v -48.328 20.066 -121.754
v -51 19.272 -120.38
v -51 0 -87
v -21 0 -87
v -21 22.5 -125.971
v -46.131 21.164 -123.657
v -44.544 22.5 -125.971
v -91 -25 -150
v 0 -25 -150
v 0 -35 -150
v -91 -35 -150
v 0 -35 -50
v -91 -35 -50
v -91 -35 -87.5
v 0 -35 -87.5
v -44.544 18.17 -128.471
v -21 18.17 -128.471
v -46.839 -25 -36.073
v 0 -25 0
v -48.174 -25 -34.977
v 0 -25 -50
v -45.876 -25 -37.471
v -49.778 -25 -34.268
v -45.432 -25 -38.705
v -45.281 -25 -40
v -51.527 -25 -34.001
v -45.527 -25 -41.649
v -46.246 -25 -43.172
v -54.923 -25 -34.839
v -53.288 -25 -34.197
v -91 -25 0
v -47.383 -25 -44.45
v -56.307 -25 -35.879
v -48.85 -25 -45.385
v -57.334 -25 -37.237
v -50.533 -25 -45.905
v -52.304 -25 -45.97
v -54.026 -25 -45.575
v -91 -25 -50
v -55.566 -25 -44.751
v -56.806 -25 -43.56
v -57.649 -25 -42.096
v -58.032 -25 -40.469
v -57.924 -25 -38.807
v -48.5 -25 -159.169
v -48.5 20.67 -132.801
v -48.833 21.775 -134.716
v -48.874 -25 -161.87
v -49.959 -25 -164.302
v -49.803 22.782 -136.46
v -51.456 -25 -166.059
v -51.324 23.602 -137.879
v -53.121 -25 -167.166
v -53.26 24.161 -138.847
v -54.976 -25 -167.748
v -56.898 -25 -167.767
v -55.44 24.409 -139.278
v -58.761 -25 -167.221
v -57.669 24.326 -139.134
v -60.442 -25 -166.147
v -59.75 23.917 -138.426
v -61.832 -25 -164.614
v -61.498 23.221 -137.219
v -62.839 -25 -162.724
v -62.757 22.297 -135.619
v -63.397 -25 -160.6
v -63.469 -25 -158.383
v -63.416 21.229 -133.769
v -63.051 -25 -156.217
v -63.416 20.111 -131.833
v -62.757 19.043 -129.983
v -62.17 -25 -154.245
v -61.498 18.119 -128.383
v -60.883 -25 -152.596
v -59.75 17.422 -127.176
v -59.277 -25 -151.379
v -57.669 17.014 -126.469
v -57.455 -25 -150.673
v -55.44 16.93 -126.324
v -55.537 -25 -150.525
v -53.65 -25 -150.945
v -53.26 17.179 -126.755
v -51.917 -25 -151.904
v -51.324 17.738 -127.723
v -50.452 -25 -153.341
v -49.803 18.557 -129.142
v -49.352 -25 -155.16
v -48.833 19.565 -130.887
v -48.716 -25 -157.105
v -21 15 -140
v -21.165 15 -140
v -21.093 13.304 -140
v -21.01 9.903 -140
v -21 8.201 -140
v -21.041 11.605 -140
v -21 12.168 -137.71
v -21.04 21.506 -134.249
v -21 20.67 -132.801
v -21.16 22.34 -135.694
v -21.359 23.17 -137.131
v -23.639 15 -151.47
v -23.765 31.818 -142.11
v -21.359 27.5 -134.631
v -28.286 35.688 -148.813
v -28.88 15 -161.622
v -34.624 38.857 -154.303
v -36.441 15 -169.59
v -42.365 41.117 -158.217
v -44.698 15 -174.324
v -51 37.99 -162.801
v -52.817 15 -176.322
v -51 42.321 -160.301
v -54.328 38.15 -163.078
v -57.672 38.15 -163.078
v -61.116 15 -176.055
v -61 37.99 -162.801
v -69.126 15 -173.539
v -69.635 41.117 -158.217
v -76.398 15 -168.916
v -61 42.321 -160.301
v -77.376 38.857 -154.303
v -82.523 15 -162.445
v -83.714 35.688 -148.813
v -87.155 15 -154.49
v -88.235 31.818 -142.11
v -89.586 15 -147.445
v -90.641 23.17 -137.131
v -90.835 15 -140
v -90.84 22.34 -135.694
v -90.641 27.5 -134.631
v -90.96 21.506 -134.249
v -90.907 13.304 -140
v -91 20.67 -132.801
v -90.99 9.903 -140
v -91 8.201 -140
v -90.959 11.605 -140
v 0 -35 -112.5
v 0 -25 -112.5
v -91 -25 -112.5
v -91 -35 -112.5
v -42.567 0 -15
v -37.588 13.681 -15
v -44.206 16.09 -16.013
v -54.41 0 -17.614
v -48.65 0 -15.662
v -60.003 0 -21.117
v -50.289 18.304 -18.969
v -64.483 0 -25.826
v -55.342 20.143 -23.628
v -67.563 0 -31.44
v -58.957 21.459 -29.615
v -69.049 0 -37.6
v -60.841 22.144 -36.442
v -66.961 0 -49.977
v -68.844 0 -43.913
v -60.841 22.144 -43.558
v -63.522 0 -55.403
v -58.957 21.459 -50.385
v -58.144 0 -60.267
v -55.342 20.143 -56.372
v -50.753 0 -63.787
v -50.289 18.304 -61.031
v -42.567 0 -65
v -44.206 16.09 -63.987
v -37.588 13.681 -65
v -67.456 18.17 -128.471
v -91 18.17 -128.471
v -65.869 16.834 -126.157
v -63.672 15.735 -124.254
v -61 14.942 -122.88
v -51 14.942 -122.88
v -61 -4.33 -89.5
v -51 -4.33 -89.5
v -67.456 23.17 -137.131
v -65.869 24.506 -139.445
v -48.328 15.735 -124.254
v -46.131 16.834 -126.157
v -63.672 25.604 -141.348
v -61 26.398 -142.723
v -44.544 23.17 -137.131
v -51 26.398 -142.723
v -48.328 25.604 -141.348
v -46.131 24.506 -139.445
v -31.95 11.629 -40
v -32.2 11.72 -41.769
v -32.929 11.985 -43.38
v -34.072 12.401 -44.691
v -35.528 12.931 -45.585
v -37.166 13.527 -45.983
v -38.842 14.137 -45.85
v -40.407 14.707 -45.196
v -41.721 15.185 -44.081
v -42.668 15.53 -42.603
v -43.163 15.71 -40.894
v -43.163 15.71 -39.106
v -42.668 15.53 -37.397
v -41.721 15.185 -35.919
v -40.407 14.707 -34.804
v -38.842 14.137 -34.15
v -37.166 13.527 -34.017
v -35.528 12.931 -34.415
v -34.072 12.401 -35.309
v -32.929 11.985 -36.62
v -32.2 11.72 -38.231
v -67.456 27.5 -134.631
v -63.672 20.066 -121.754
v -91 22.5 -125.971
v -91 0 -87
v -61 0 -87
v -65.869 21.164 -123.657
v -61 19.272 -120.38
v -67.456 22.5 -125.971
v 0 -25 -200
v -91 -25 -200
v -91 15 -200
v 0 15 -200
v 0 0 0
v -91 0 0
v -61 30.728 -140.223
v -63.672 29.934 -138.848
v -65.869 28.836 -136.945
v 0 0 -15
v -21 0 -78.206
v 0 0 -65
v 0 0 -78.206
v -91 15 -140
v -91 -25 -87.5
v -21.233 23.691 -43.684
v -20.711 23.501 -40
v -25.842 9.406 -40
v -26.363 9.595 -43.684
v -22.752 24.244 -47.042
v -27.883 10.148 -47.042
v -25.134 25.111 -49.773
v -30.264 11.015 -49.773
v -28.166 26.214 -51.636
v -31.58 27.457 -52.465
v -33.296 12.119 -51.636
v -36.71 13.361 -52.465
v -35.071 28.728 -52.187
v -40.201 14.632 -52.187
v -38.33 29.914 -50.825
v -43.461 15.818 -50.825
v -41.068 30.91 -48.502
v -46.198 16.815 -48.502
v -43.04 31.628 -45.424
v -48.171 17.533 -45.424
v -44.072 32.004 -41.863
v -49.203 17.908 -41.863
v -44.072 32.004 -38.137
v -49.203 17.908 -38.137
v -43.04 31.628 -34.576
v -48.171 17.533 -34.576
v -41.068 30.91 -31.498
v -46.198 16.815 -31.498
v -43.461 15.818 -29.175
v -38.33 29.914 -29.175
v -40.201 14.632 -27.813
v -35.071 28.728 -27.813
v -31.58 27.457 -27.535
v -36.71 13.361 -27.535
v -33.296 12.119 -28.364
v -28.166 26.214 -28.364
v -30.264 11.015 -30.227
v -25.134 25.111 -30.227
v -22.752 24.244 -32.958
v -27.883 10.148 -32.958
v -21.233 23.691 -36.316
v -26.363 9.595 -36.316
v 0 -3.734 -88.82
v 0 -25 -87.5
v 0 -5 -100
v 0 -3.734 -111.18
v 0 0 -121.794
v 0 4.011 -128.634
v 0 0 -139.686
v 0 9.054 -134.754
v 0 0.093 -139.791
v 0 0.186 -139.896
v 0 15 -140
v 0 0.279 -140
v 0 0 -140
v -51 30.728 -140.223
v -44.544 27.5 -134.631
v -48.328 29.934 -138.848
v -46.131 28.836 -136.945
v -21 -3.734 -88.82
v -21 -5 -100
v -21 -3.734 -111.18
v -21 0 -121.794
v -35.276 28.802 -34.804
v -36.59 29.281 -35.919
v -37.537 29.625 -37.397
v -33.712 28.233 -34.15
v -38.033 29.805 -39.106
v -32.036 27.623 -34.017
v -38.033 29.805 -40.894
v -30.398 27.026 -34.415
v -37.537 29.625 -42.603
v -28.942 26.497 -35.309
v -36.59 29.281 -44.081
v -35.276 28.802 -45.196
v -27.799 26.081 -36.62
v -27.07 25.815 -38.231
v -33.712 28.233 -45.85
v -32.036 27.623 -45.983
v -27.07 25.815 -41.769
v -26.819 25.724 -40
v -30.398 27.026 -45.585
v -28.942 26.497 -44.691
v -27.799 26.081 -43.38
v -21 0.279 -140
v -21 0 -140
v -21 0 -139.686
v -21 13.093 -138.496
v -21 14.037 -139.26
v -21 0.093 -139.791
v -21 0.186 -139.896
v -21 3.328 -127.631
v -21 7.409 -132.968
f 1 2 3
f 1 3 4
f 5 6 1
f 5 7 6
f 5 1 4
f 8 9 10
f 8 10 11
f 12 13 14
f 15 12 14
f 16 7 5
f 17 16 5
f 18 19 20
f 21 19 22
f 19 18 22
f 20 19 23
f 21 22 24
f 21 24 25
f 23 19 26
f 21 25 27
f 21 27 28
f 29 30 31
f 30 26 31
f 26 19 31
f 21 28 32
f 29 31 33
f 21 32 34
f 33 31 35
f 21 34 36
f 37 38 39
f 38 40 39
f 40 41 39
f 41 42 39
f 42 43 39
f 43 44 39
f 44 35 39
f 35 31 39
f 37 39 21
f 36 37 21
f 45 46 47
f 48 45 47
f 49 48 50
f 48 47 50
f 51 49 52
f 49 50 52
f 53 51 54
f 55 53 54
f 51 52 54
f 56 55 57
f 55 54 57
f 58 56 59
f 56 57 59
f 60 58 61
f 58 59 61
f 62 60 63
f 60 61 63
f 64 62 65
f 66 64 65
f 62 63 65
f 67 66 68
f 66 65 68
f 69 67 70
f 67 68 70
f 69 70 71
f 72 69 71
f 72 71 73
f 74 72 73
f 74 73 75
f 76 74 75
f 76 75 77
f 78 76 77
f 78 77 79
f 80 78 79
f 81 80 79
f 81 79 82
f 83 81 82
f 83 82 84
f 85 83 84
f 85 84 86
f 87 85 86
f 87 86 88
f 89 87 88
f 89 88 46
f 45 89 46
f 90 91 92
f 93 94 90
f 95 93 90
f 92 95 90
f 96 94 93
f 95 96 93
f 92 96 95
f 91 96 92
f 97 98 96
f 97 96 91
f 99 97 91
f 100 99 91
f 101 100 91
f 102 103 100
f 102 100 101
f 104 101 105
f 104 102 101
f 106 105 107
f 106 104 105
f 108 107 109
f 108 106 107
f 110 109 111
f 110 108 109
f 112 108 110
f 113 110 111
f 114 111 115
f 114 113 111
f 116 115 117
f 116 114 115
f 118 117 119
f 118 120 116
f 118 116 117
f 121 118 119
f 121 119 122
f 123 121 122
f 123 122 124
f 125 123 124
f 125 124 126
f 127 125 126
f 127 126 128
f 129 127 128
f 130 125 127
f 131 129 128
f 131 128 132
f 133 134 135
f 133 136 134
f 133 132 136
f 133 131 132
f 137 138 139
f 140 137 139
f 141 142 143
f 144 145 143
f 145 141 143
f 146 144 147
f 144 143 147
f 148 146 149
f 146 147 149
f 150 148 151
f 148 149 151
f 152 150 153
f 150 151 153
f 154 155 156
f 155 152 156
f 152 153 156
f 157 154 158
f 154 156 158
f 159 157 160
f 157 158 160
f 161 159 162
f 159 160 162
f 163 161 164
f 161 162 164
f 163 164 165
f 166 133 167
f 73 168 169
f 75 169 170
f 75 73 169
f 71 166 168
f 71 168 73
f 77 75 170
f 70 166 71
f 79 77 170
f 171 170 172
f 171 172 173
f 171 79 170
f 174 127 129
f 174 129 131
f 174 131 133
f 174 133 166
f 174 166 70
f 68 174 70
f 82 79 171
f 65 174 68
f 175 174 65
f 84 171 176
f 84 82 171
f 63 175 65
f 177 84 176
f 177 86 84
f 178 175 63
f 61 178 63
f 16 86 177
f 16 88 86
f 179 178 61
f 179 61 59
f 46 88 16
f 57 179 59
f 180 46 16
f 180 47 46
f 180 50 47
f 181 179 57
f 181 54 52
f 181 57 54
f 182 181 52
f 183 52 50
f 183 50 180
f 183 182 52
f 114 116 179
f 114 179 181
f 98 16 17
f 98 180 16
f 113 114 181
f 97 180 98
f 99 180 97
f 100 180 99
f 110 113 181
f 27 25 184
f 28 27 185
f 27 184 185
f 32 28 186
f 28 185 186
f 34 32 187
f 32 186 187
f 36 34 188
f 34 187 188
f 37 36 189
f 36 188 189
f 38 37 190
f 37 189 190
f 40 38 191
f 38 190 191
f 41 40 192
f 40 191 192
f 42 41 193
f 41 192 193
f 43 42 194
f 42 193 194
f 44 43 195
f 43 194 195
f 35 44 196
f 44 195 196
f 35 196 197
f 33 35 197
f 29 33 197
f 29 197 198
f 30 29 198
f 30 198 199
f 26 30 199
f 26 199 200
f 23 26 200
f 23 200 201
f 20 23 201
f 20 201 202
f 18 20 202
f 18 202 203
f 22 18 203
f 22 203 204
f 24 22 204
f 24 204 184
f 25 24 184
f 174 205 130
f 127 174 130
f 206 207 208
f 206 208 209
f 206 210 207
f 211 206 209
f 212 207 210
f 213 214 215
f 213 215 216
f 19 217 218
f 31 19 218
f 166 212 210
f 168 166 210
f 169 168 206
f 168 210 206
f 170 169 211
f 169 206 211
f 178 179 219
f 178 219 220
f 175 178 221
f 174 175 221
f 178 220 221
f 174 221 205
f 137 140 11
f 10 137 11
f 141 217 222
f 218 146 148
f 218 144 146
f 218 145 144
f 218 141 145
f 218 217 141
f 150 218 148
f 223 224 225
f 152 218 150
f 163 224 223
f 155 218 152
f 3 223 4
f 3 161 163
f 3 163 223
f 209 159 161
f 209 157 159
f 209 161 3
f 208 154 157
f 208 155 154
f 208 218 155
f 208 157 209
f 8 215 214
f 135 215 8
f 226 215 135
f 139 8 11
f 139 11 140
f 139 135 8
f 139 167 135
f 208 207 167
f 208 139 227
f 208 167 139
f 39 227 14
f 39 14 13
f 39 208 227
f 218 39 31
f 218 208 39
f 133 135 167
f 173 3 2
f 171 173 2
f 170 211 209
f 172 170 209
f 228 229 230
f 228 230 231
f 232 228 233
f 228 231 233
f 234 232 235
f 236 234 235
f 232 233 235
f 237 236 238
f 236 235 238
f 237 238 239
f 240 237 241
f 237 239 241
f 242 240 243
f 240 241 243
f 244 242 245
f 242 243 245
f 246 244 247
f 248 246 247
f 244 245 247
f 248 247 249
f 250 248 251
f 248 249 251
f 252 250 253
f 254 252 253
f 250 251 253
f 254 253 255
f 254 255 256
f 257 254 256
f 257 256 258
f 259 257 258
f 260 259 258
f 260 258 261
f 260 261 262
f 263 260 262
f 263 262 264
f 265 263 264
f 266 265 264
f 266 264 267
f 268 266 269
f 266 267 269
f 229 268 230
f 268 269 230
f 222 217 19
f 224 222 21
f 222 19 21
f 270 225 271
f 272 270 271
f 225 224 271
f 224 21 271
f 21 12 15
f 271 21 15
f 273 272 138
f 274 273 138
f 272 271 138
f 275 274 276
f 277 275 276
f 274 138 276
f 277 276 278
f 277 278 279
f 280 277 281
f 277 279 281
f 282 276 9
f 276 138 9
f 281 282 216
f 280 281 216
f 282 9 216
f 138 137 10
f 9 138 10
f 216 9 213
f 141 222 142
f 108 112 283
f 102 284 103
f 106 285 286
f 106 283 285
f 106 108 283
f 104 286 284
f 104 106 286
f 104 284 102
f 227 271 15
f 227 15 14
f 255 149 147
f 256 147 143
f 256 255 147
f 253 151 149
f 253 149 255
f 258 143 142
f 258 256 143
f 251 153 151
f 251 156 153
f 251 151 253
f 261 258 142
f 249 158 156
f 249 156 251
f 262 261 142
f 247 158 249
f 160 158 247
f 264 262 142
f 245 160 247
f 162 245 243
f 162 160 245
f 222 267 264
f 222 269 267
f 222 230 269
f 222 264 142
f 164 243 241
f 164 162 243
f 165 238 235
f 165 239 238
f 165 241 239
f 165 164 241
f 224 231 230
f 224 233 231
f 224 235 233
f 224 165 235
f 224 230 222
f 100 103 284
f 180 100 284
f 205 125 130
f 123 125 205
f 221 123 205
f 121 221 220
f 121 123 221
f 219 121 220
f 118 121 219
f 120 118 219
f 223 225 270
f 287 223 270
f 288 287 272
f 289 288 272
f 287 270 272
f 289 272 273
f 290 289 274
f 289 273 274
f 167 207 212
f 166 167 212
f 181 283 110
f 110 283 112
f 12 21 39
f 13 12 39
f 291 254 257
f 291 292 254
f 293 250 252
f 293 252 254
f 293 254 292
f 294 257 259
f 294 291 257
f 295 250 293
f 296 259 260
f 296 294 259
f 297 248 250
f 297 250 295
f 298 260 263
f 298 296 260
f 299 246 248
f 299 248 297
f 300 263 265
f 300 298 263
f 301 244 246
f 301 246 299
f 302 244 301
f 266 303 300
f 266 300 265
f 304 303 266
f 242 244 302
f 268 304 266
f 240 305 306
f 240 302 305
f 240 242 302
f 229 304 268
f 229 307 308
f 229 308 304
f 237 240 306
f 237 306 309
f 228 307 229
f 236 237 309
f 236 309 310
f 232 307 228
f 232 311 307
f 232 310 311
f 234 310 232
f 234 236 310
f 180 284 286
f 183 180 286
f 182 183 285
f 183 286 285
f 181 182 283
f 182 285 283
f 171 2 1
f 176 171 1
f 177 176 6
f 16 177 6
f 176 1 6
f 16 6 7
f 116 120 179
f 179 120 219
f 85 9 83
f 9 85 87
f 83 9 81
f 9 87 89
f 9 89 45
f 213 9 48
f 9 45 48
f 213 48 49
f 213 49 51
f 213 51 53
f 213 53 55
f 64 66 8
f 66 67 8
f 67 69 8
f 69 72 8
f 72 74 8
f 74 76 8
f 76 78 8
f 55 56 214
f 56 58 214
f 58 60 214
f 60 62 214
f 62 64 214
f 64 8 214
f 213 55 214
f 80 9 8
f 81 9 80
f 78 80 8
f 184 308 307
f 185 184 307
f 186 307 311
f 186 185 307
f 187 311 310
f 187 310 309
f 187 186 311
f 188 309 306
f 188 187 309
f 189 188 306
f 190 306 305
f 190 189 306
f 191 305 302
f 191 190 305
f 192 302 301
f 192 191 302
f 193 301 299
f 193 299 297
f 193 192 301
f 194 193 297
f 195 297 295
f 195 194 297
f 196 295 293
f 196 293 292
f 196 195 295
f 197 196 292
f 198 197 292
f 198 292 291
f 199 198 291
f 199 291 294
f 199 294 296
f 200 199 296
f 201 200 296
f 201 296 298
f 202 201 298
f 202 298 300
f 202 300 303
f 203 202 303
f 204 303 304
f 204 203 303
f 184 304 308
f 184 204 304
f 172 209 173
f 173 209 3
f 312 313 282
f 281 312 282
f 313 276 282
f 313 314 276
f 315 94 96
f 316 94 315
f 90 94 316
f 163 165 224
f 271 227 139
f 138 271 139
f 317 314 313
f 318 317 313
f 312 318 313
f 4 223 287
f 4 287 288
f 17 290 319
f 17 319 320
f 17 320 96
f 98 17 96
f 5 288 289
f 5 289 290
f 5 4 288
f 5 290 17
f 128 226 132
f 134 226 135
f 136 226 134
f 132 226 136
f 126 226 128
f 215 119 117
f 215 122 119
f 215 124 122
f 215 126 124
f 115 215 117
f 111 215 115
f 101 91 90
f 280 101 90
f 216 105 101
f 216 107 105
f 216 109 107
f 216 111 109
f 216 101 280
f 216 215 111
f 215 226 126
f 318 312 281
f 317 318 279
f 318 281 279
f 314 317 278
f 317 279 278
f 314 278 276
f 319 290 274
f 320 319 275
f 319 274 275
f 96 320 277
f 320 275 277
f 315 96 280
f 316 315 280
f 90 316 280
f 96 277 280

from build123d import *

# Parameters (mm, degrees)
SKETCH1_W               = 50
SKETCH1_H               = 91
SKETCH1_W_2             = 37.5
SKETCH1_W_3             = 25
BOSS_EXTRUDE1_DEPTH     = 25
SKETCH1_3_W             = 37.5
SKETCH1_3_H             = 91
BOSS_EXTRUDE2_DEPTH     = 35
BOSS_EXTRUDE3_REACH     = 66.013
SKETCH4_R               = 12.5
SKETCH4_R_2             = 6
SKETCH4_4_R             = 6
CUT_EXTRUDE1_DEPTH      = 65.01307477
SKETCH4_5_R             = 12.5
SKETCH4_5_R_2           = 6
BOSS_EXTRUDE4_DEPTH     = 15
SKETCH5_W               = 91
SKETCH5_H               = 60
BOSS_EXTRUDE5_DEPTH     = 15
CUT_EXTRUDE2_DEPTH      = 1
CUT_EXTRUDE2_DEPTH_BACK = 21
EXTRUDE_THIN1_DEPTH     = 21
BOSS_EXTRUDE6_REACH     = 88.811
SKETCH9_R               = 7.5
CUT_EXTRUDE4_DEPTH      = 5
SKETCH9_6_R             = 12.5
CUT_EXTRUDE5_DEPTH      = 5
SKETCH9_7_R             = 7.5
CUT_EXTRUDE6_DEPTH      = 87.810889132


with BuildPart() as part:
    # Sketch1 → Boss-Extrude1 (new body)
    with BuildSketch(Plane(origin=(0, 0, 0), x_dir=(0, 0, -1), z_dir=(0, 1, 0))):
        with Locations((25, 45.5)):
            Rectangle(SKETCH1_W, SKETCH1_H)
        with Locations((68.75, 45.5)):
            Rectangle(SKETCH1_W_2, SKETCH1_H)
        with Locations((100, 45.5)):
            Rectangle(SKETCH1_W_3, SKETCH1_H)
        with Locations((131.25, 45.5)):
            Rectangle(SKETCH1_W_2, SKETCH1_H)
        with Locations((175, 45.5)):
            Rectangle(SKETCH1_W, SKETCH1_H)
    extrude(amount=-BOSS_EXTRUDE1_DEPTH)

    # Sketch1<3> → Boss-Extrude2 (add)
    with BuildSketch(Plane(origin=(0, 0, 0), x_dir=(0, 0, -1), z_dir=(0, 1, 0))):
        with Locations((68.75, 45.5)):
            Rectangle(SKETCH1_3_W, SKETCH1_3_H)
        with Locations((131.25, 45.5)):
            Rectangle(SKETCH1_3_W, SKETCH1_3_H)
    extrude(amount=-BOSS_EXTRUDE2_DEPTH)

    # Boss-Extrude3: up to this face of the body (flat: up to its plane)
    boss_extrude3_end = Plane(part.part.faces().sort_by_distance((-45.5, 0, -100))[0])
    # Sketch4 → Boss-Extrude3 (add, up to the picked face)
    with BuildSketch(Plane(origin=(0, 0, 0), x_dir=(0.939692621, -0.342020143, 0), z_dir=(0.342020143, 0.939692621, 0)), mode=Mode.PRIVATE) as boss_extrude3_sk1:
        with BuildLine():
            ThreePointArc((-40, 15), (-65, 40), (-40, 65))
            Line((-40, 65), (0, 65))
            Line((0, 65), (0, 15))
            Line((0, 15), (-40, 15))
        make_face()
        with Locations((-40, 40)):
            Circle(SKETCH4_R, mode=Mode.SUBTRACT)
    boss_extrude3_tool1 = split(extrude(boss_extrude3_sk1.sketch, amount=-BOSS_EXTRUDE3_REACH, mode=Mode.PRIVATE), bisect_by=boss_extrude3_end, keep=Keep.BOTH, mode=Mode.PRIVATE)
    add(boss_extrude3_tool1.solids().sort_by_distance((-60.309415, 21.950832, -40))[0])
    # Sketch4 → Boss-Extrude3 (add, up to the picked face)
    with BuildSketch(Plane(origin=(0, 0, 0), x_dir=(0.939692621, -0.342020143, 0), z_dir=(0.342020143, 0.939692621, 0)), mode=Mode.PRIVATE) as boss_extrude3_sk2:
        with Locations((-40, 40)):
            Circle(SKETCH4_R)
        with Locations((-40, 40)):
            Circle(SKETCH4_R_2, mode=Mode.SUBTRACT)
    boss_extrude3_tool2 = split(extrude(boss_extrude3_sk2.sketch, amount=-BOSS_EXTRUDE3_REACH, mode=Mode.PRIVATE), bisect_by=boss_extrude3_end, keep=Keep.BOTH, mode=Mode.PRIVATE)
    add(boss_extrude3_tool2.solids().sort_by_distance((-49.001631, 17.835135, -40))[0])

    # Sketch4<4> → Cut-Extrude1 (cut, through all)
    with BuildSketch(Plane(origin=(0, 0, 0), x_dir=(0.939692621, -0.342020143, 0), z_dir=(0.342020143, 0.939692621, 0))):
        with Locations((-40, 40)):
            Circle(SKETCH4_4_R)
    extrude(amount=-CUT_EXTRUDE1_DEPTH, mode=Mode.SUBTRACT)

    # Sketch4<5> → Boss-Extrude4 (add)
    with BuildSketch(Plane(origin=(0, 0, 0), x_dir=(0.939692621, -0.342020143, 0), z_dir=(0.342020143, 0.939692621, 0))):
        with Locations((-40, 40)):
            Circle(SKETCH4_5_R)
        with Locations((-40, 40)):
            Circle(SKETCH4_5_R_2, mode=Mode.SUBTRACT)
    extrude(amount=BOSS_EXTRUDE4_DEPTH)

    # Sketch5 → Boss-Extrude5 (add)
    with BuildSketch(Plane(origin=(0, 0, 0), x_dir=(1, 0, 0), z_dir=(0, 1, 0))):
        with Locations((-45.5, 170)):
            Rectangle(SKETCH5_W, SKETCH5_H)
    extrude(amount=BOSS_EXTRUDE5_DEPTH)

    # Sketch6 → Cut-Extrude2 (cut, two sides)
    with BuildSketch(Plane(origin=(0, 0, 0), x_dir=(0, 0, -1), z_dir=(1, 0, 0))) as cut_extrude2_sk:
        with BuildLine():
            ThreePointArc((78.205505282, 0), (100, -5), (121.794494718, 0))
            Line((121.794494718, 0), (78.205505282, 0))
        make_face()
    extrude(amount=CUT_EXTRUDE2_DEPTH, mode=Mode.SUBTRACT)
    extrude(cut_extrude2_sk.sketch, amount=-CUT_EXTRUDE2_DEPTH_BACK, mode=Mode.SUBTRACT)

    # Sketch6<2> → Extrude-Thin1 (add)
    with BuildSketch(Plane(origin=(0, 0, 0), x_dir=(0, 0, -1), z_dir=(1, 0, 0))):
        with BuildLine():
            ThreePointArc((78.205505282, 0), (111.794494718, -3.588989435), (140, 15))
            Line((140, 15), (148, 9))
            ThreePointArc((148, 9), (114.153393661, -13.306787322), (73.846606339, -9))
            Line((73.846606339, -9), (78.205505282, 0))
        make_face()
    extrude(amount=-EXTRUDE_THIN1_DEPTH)

    # Sketch9 → Boss-Extrude6 (add, up to next)
    with BuildSketch(Plane(origin=(0, -37.672105065, -21.75), x_dir=(1, 0, 0), z_dir=(0, 0.866025404, 0.5)), mode=Mode.PRIVATE) as boss_extrude6_sk1:
        with BuildLine():
            Line((-21, 75.344210129), (-21, 125.344210129))
            ThreePointArc((-21, 125.344210129), (-56, 160.344210129), (-91, 125.344210129))
            Line((-91, 125.344210129), (-91, 75.344210129))
            Line((-91, 75.344210129), (-21, 75.344210129))
        make_face()
        with Locations((-56, 125.344210129)):
            Circle(SKETCH9_R, mode=Mode.SUBTRACT)
    boss_extrude6_tool1 = extrude(boss_extrude6_sk1.sketch, amount=-BOSS_EXTRUDE6_REACH, mode=Mode.PRIVATE) - part.part
    add(boss_extrude6_tool1.solids().sort_by_distance((-56, 19.386227, -120.577931))[0])

    # Sketch9<5> → Cut-Extrude4 (cut)
    with BuildSketch(Plane(origin=(0, -37.672105065, -21.75), x_dir=(1, 0, 0), z_dir=(0, 0.866025404, 0.5))):
        with BuildLine():
            Line((-44.543560763, 120.344210129), (-21, 120.344210129))
            Line((-21, 120.344210129), (-21, 125.344210129))
            ThreePointArc((-21, 125.344210129), (-21.08986132, 127.850645317), (-21.358983849, 130.344210129))
            Line((-21.358983849, 130.344210129), (-44.543560763, 130.344210129))
            ThreePointArc((-44.543560763, 130.344210129), (-43.5, 125.344210129), (-44.543560763, 120.344210129))
        make_face()
        with BuildLine():
            Line((-61, 75.344210129), (-51, 75.344210129))
            Line((-51, 75.344210129), (-51, 113.887770892))
            ThreePointArc((-51, 113.887770892), (-56, 112.844210129), (-61, 113.887770892))
            Line((-61, 113.887770892), (-61, 75.344210129))
        make_face()
        with BuildLine():
            Line((-51, 136.800649367), (-51, 159.985226281))
            ThreePointArc((-51, 159.985226281), (-56, 160.344210129), (-61, 159.985226281))
            Line((-61, 159.985226281), (-61, 136.800649367))
            ThreePointArc((-61, 136.800649367), (-56, 137.844210129), (-51, 136.800649367))
        make_face()
        with BuildLine():
            Line((-91, 125.344210129), (-91, 120.344210129))
            Line((-91, 120.344210129), (-67.456439237, 120.344210129))
            ThreePointArc((-67.456439237, 120.344210129), (-68.5, 125.344210129), (-67.456439237, 130.344210129))
            Line((-67.456439237, 130.344210129), (-90.641016151, 130.344210129))
            ThreePointArc((-90.641016151, 130.344210129), (-90.91013868, 127.850645317), (-91, 125.344210129))
        make_face()
    extrude(amount=-CUT_EXTRUDE4_DEPTH, mode=Mode.SUBTRACT)

    # Sketch9<6> → Cut-Extrude5 (cut)
    with BuildSketch(Plane(origin=(0, -37.672105065, -21.75), x_dir=(1, 0, 0), z_dir=(0, 0.866025404, 0.5))):
        with Locations((-56, 125.344210129)):
            Circle(SKETCH9_6_R)
    extrude(amount=-CUT_EXTRUDE5_DEPTH, mode=Mode.SUBTRACT)

    # Sketch9<7> → Cut-Extrude6 (cut, through all)
    with BuildSketch(Plane(origin=(0, -37.672105065, -21.75), x_dir=(1, 0, 0), z_dir=(0, 0.866025404, 0.5))):
        with Locations((-56, 125.344210129)):
            Circle(SKETCH9_7_R)
    extrude(amount=-CUT_EXTRUDE6_DEPTH, mode=Mode.SUBTRACT)


solid = part.part
